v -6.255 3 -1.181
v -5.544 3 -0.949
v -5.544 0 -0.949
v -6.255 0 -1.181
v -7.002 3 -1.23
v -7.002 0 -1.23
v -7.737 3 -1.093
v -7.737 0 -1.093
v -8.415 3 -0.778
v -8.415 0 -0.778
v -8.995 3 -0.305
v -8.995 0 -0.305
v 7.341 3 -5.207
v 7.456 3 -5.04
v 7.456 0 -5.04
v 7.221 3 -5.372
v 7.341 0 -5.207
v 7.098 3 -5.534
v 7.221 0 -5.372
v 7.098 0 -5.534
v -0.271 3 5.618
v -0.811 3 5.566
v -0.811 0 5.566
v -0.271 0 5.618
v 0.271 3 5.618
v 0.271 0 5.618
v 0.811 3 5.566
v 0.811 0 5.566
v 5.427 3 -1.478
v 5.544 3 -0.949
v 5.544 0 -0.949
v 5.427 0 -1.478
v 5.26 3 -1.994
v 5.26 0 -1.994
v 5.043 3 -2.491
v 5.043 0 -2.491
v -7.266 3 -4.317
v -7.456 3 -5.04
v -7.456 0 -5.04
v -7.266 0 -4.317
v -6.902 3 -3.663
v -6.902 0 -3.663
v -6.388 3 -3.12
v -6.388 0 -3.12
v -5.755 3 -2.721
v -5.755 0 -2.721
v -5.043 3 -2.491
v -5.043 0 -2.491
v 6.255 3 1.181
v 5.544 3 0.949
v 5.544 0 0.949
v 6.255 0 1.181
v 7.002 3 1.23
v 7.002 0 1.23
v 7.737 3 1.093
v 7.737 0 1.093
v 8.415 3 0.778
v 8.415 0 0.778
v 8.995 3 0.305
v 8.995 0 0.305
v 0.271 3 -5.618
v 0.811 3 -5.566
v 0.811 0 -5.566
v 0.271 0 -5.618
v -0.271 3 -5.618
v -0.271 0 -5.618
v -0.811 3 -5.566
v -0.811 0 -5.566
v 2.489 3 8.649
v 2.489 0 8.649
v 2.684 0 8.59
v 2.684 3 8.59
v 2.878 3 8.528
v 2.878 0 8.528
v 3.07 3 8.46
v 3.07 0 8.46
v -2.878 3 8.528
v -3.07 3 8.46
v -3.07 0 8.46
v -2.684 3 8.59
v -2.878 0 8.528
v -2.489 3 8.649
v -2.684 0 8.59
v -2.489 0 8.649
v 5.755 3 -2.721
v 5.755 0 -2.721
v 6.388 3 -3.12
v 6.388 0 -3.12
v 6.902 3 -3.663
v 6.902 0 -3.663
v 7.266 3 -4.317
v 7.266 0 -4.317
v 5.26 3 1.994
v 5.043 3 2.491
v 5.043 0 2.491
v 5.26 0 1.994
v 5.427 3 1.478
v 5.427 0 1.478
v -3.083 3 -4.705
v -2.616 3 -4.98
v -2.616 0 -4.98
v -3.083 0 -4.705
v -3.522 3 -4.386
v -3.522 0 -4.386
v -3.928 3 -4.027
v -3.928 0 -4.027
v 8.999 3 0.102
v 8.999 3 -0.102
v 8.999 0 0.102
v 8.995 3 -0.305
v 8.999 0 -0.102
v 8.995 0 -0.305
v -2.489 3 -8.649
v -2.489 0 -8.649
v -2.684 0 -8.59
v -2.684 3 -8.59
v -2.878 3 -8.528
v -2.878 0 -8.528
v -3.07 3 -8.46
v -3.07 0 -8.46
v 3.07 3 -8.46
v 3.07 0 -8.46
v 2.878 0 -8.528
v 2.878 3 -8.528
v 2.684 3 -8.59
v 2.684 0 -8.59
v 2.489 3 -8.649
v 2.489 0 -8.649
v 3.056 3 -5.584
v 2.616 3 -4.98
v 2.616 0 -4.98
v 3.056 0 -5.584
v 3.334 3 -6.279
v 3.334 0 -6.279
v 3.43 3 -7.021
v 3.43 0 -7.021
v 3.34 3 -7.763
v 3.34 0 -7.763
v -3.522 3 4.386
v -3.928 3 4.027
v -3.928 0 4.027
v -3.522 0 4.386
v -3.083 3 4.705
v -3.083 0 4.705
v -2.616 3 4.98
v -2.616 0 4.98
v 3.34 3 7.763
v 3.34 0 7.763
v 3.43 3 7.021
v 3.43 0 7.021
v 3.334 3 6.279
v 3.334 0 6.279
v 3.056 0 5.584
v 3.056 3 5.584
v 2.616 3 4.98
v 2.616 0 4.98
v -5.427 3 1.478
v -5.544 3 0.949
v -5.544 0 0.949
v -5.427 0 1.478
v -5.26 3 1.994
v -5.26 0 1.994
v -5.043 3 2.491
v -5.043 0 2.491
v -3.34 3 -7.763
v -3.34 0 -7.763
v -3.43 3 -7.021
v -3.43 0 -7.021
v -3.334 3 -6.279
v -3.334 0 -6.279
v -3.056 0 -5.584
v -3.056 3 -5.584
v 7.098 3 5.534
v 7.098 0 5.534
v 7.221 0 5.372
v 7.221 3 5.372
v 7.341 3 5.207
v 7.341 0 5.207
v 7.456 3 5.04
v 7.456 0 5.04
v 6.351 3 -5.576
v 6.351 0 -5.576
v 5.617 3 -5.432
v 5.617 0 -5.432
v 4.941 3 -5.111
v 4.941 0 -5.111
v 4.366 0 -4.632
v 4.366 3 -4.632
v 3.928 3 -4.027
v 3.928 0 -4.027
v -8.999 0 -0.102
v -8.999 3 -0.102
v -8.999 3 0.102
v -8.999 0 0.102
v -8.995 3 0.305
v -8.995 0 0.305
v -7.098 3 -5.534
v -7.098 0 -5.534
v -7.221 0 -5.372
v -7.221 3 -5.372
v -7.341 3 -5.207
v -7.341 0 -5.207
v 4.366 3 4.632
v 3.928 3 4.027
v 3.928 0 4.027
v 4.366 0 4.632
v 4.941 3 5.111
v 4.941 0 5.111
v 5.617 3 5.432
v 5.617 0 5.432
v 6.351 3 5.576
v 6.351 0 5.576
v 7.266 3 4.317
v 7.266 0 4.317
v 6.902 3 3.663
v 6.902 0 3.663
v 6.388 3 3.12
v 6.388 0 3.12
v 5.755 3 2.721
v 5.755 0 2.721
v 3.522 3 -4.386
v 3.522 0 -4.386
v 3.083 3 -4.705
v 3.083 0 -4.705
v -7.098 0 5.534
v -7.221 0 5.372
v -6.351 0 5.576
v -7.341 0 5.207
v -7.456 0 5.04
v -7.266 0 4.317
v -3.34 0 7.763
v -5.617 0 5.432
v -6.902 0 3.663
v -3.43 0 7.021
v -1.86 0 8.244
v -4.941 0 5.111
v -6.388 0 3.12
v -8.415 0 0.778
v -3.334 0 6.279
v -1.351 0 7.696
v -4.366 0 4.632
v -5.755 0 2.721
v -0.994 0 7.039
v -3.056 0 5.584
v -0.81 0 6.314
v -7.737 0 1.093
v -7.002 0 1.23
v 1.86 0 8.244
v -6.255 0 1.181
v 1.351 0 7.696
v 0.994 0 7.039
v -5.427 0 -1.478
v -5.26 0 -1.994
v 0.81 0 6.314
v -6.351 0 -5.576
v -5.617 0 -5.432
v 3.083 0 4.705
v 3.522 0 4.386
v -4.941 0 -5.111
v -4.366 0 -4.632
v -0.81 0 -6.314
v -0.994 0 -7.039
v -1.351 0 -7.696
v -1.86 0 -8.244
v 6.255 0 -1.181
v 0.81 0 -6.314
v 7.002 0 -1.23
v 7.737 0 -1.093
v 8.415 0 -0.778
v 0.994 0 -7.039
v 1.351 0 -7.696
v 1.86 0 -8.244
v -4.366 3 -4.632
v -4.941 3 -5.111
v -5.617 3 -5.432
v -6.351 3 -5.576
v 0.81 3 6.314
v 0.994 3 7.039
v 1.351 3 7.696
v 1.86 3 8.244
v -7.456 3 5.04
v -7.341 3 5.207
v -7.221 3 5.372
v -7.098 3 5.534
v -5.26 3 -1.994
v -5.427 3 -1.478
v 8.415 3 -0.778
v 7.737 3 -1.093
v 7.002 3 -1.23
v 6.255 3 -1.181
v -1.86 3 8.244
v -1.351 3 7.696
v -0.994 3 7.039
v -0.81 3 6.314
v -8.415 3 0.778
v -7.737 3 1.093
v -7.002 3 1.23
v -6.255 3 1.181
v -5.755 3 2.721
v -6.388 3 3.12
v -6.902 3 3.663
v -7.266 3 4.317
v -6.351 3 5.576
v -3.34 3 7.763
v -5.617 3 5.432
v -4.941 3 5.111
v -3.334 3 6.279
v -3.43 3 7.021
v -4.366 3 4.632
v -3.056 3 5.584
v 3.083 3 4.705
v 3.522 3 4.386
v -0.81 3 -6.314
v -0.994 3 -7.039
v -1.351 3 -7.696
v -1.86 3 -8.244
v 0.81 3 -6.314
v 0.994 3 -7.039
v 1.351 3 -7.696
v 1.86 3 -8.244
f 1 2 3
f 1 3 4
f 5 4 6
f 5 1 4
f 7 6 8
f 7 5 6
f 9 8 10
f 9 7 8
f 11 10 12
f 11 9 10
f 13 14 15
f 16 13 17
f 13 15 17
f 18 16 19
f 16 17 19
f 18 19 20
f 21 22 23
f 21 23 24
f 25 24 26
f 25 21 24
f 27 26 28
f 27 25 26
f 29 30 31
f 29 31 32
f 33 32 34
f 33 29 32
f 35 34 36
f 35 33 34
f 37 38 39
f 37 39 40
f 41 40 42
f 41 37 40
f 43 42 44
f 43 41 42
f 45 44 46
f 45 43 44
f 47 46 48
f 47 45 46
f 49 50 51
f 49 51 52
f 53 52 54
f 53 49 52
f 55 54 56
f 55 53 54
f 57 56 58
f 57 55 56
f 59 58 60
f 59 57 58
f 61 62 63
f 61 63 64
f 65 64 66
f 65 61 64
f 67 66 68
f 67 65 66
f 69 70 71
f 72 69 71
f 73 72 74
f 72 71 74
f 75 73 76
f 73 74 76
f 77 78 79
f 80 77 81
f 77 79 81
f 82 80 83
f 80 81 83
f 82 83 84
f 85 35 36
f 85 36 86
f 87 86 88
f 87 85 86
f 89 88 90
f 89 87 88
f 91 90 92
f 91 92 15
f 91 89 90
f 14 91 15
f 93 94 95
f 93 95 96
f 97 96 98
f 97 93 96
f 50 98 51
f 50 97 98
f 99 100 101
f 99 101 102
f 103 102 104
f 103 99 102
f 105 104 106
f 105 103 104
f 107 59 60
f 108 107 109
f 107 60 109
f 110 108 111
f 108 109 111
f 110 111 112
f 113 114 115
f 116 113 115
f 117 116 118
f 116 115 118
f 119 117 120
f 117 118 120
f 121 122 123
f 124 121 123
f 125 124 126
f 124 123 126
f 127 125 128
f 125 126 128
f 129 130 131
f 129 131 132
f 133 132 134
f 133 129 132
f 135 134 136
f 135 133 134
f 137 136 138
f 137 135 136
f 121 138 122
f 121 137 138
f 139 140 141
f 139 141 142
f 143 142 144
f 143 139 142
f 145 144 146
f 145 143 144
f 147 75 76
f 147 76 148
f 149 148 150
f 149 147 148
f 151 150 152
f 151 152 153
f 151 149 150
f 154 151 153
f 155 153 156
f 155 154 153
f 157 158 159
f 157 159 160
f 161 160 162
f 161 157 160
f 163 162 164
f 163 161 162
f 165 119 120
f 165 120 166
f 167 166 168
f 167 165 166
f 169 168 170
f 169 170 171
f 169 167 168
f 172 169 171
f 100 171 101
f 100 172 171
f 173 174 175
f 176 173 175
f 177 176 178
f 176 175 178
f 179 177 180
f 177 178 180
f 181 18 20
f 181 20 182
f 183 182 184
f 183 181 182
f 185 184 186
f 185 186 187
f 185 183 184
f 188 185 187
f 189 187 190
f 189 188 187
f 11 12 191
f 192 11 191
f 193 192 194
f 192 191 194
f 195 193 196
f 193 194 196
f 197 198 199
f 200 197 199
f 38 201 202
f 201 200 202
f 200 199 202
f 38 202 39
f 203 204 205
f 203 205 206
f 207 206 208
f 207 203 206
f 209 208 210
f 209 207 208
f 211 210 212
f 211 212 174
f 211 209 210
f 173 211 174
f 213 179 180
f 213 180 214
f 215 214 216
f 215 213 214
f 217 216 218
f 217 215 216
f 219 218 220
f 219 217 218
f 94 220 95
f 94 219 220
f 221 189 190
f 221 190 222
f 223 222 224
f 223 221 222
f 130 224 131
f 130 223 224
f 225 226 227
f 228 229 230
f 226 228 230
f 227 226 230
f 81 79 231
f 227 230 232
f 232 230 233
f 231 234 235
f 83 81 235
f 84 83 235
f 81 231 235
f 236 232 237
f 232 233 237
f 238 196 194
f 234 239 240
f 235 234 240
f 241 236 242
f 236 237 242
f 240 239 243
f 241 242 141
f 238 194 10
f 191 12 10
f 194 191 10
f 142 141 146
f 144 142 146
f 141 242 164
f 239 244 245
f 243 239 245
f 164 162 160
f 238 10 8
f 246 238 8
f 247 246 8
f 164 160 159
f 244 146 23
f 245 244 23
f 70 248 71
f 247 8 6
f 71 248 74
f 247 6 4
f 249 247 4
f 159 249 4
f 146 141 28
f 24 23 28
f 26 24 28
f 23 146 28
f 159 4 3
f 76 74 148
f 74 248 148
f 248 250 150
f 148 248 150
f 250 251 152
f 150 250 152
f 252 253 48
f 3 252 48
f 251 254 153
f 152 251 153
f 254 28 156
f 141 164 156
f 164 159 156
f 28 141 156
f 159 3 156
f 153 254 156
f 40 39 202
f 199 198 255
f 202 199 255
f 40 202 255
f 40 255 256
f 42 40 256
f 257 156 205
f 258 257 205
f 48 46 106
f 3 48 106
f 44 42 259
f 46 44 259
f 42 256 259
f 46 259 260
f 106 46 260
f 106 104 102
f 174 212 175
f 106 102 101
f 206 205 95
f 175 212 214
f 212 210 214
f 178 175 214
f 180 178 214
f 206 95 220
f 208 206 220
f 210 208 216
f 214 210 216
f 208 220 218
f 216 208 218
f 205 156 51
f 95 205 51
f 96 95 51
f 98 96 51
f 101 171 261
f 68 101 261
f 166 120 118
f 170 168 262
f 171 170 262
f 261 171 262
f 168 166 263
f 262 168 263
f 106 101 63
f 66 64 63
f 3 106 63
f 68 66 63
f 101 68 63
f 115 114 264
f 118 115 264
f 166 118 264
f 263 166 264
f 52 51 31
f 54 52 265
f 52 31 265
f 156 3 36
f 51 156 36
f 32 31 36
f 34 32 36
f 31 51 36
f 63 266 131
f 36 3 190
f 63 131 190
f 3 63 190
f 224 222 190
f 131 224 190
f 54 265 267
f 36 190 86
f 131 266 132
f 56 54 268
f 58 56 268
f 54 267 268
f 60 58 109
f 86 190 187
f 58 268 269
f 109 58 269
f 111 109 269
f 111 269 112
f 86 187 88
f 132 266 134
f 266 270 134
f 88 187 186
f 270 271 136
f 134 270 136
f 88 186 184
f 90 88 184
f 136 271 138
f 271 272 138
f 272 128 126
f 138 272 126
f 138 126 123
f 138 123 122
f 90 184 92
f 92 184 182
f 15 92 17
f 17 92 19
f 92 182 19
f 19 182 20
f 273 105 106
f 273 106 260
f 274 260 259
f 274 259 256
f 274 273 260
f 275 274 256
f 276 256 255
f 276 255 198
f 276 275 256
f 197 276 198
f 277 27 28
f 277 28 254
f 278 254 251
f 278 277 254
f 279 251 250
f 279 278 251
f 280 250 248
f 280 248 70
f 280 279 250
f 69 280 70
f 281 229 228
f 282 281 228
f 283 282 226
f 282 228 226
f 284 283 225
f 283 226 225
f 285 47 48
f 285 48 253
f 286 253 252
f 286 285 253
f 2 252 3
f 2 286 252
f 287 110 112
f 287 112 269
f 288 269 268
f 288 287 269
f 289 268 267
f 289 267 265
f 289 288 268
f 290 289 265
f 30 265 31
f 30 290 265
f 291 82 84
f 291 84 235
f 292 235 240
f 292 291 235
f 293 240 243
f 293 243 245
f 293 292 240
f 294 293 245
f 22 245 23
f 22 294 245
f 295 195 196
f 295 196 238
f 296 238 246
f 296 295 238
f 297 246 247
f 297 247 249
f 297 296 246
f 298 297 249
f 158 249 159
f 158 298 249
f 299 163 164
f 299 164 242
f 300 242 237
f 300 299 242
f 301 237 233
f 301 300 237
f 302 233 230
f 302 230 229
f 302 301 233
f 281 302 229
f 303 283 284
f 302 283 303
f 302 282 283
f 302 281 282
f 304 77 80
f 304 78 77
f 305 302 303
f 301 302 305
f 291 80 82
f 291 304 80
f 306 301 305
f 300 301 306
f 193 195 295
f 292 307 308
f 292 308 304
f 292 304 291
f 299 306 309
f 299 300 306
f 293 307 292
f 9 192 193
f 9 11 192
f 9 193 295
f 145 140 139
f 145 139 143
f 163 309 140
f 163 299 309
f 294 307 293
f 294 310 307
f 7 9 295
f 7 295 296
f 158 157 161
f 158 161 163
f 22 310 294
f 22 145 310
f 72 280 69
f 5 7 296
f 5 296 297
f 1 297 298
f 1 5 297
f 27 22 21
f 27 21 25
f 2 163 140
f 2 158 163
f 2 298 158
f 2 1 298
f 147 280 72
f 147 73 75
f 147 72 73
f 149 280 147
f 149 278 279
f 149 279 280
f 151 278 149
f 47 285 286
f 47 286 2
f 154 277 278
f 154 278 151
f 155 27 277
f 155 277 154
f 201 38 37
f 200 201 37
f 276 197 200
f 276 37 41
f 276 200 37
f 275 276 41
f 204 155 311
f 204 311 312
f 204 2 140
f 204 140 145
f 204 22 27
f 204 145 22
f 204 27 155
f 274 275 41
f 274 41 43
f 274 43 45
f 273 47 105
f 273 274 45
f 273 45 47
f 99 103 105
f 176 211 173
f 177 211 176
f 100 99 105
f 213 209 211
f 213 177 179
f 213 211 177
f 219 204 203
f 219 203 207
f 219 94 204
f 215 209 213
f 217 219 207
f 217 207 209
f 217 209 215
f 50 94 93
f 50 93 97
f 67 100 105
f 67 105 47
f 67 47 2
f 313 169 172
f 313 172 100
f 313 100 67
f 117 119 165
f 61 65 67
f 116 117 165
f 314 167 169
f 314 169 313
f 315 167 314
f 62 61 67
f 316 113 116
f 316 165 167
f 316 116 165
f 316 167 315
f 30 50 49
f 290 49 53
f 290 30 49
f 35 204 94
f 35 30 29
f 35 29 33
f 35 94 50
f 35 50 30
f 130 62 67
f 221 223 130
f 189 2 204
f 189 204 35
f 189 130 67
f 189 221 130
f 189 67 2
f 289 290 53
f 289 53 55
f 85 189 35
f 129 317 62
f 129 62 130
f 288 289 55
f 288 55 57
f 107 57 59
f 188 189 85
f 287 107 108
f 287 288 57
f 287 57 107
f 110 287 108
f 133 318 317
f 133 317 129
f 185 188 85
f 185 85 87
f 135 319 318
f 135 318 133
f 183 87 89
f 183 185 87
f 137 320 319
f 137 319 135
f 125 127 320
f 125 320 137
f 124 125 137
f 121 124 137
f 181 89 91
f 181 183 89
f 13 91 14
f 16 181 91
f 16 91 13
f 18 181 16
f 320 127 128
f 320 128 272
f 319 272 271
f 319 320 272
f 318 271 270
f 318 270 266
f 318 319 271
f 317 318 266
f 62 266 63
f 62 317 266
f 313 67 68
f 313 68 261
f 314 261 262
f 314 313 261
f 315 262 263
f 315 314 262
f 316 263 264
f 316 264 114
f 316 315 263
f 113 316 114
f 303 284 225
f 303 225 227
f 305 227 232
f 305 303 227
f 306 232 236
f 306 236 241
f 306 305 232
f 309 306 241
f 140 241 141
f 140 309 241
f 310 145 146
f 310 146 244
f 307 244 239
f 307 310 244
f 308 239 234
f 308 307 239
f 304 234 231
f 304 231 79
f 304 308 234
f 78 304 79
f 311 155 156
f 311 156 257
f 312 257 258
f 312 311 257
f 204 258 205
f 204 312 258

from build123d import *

# Parameters (mm, degrees)
SKETCH1_R           = 9
BOSS_EXTRUDE1_DEPTH = 3
CUT_EXTRUDE1_DEPTH  = 4
CIRPATTERN1_COUNT   = 10


with BuildPart() as part:
    # Sketch1 → Boss-Extrude1 (new body)
    with BuildSketch(Plane(origin=(0, 0, 0), x_dir=(1, 0, 0), z_dir=(0, 1, 0))):
        Circle(SKETCH1_R)
    extrude(amount=BOSS_EXTRUDE1_DEPTH)

    # Sketch2 → Cut-Extrude1 (cut, through all)
    with BuildSketch(Plane(origin=(0, 3, 0), x_dir=(1, 0, 0), z_dir=(0, 1, 0))):
        with BuildLine():
            ThreePointArc((-2.489254397, 8.648908171), (0, 9), (2.489254397, 8.648908171))
            ThreePointArc((2.489254397, 8.648908171), (1.152028564, 7.378729724), (0.810569881, 5.566291536))
            ThreePointArc((0.810569881, 5.566291536), (0, 5.625), (-0.810569881, 5.566291536))
            ThreePointArc((-0.810569881, 5.566291536), (-1.152028564, 7.378729724), (-2.489254397, 8.648908171))
        make_face()
    cut_extrude1 = extrude(amount=-CUT_EXTRUDE1_DEPTH, mode=Mode.SUBTRACT)

    # CirPattern1: Cut-Extrude1 ×10 about axis
    cirpattern1_axis = Axis((0, 0, 0), (0, 1, 0))
    for i in range(1, CIRPATTERN1_COUNT):
        add(cut_extrude1.rotate(cirpattern1_axis, i * 360 / CIRPATTERN1_COUNT), mode=Mode.SUBTRACT)


solid = part.part
